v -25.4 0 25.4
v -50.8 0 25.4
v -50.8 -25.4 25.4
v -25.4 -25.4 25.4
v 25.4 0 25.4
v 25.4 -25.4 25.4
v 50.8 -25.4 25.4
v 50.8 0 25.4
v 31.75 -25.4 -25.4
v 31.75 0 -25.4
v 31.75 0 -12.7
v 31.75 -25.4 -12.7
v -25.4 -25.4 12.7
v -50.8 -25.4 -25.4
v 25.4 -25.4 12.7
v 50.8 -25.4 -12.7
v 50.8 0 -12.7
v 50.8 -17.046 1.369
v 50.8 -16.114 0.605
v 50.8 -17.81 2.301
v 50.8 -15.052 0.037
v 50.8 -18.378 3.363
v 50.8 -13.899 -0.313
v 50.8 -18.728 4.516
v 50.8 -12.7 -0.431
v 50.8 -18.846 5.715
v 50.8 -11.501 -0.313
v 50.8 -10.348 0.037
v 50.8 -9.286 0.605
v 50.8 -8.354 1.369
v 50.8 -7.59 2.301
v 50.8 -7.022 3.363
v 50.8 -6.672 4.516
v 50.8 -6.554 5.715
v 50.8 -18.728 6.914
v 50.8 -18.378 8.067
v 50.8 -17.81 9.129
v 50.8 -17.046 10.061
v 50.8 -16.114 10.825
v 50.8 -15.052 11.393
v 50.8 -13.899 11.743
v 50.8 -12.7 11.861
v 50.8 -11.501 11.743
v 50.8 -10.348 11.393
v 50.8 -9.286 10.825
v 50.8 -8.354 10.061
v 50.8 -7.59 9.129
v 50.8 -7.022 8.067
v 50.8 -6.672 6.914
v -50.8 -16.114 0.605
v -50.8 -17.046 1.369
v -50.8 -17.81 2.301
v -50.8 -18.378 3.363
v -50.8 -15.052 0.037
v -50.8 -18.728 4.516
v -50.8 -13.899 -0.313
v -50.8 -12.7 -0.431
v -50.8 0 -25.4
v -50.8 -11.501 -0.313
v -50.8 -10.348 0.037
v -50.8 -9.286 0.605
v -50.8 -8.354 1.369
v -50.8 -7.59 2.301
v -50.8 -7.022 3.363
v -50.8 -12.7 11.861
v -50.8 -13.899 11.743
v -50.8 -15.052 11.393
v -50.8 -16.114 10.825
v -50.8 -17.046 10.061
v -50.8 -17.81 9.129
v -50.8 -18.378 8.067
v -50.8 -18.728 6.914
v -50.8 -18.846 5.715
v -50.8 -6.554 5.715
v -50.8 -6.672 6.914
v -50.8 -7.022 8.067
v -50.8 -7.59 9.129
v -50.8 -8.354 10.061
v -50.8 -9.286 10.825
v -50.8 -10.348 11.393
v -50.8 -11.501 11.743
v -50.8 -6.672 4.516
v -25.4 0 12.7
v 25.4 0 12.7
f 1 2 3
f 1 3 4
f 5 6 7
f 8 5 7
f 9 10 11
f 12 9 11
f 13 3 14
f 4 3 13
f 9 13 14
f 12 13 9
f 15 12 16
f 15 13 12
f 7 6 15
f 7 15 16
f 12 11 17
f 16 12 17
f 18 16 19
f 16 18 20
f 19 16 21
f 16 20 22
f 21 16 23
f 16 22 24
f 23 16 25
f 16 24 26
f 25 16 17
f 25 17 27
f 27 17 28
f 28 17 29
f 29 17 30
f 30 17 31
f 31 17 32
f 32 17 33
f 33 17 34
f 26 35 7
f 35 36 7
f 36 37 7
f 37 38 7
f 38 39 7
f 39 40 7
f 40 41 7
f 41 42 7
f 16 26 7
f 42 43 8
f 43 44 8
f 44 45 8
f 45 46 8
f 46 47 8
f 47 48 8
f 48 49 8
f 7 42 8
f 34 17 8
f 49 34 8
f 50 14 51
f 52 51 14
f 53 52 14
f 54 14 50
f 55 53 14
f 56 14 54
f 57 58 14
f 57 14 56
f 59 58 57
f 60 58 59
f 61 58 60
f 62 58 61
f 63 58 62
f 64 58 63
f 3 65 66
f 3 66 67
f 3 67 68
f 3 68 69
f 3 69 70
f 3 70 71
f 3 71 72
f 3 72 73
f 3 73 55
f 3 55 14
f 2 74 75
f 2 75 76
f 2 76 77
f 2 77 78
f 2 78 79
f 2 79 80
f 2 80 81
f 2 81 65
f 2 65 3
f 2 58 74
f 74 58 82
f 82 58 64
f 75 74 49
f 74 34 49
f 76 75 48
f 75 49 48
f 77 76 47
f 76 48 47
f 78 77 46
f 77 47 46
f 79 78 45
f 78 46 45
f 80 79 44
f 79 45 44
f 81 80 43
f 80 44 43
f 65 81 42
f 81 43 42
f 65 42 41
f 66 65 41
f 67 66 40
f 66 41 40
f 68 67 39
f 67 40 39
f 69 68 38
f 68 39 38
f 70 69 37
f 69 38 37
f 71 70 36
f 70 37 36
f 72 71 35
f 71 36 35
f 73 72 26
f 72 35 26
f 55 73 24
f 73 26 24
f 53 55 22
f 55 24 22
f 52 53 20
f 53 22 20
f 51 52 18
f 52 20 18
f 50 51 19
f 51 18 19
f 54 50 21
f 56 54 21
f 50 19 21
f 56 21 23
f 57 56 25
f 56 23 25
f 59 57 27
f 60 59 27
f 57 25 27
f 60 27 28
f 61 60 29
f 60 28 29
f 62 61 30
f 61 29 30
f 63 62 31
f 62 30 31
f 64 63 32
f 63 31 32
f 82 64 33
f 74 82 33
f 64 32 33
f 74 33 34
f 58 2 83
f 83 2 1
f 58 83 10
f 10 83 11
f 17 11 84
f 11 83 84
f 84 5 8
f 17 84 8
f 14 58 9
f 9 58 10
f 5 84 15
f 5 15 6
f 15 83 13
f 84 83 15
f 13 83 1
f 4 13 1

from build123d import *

# Parameters (mm, degrees)
F0_W     = 101.6
F0_H     = 50.8
F1_DEPTH = 25.4
F2_W     = 50.8
F2_H     = 12.7
F3_DEPTH = 25.401
F4_W     = 19.05
F4_H     = 12.7
F5_DEPTH = 25.401
F6_R     = 6.14583
F7_DEPTH = 50.8
F8_DEPTH = 50.801


with BuildPart() as f1:
    # F0 (on Front) → F1 (new body)
    with BuildSketch(Plane.XZ):
        Rectangle(F0_W, F0_H)
    extrude(amount=F1_DEPTH)

    # F2 (on Front) → F3 (cut, through all)
    with BuildSketch(Plane.XZ):
        with Locations((0, 19.05)):
            Rectangle(F2_W, F2_H)
    extrude(amount=F3_DEPTH, mode=Mode.SUBTRACT)

    # F4 (on Front) → F5 (cut, through all)
    with BuildSketch(Plane.XZ):
        with Locations((41.275, -19.05)):
            Rectangle(F4_W, F4_H)
    extrude(amount=F5_DEPTH, mode=Mode.SUBTRACT)

    # F6 (on Right) → F7 (cut)
    with BuildSketch(Plane.YZ):
        with Locations((-12.7, 5.715)):
            Circle(F6_R)
    extrude(amount=-F7_DEPTH, mode=Mode.SUBTRACT)

    # F6 (on Right) → F8 (cut, through all)
    with BuildSketch(Plane.YZ):
        with Locations((-12.7, 5.715)):
            Circle(F6_R)
    extrude(amount=F8_DEPTH, mode=Mode.SUBTRACT)


solid = f1.part
